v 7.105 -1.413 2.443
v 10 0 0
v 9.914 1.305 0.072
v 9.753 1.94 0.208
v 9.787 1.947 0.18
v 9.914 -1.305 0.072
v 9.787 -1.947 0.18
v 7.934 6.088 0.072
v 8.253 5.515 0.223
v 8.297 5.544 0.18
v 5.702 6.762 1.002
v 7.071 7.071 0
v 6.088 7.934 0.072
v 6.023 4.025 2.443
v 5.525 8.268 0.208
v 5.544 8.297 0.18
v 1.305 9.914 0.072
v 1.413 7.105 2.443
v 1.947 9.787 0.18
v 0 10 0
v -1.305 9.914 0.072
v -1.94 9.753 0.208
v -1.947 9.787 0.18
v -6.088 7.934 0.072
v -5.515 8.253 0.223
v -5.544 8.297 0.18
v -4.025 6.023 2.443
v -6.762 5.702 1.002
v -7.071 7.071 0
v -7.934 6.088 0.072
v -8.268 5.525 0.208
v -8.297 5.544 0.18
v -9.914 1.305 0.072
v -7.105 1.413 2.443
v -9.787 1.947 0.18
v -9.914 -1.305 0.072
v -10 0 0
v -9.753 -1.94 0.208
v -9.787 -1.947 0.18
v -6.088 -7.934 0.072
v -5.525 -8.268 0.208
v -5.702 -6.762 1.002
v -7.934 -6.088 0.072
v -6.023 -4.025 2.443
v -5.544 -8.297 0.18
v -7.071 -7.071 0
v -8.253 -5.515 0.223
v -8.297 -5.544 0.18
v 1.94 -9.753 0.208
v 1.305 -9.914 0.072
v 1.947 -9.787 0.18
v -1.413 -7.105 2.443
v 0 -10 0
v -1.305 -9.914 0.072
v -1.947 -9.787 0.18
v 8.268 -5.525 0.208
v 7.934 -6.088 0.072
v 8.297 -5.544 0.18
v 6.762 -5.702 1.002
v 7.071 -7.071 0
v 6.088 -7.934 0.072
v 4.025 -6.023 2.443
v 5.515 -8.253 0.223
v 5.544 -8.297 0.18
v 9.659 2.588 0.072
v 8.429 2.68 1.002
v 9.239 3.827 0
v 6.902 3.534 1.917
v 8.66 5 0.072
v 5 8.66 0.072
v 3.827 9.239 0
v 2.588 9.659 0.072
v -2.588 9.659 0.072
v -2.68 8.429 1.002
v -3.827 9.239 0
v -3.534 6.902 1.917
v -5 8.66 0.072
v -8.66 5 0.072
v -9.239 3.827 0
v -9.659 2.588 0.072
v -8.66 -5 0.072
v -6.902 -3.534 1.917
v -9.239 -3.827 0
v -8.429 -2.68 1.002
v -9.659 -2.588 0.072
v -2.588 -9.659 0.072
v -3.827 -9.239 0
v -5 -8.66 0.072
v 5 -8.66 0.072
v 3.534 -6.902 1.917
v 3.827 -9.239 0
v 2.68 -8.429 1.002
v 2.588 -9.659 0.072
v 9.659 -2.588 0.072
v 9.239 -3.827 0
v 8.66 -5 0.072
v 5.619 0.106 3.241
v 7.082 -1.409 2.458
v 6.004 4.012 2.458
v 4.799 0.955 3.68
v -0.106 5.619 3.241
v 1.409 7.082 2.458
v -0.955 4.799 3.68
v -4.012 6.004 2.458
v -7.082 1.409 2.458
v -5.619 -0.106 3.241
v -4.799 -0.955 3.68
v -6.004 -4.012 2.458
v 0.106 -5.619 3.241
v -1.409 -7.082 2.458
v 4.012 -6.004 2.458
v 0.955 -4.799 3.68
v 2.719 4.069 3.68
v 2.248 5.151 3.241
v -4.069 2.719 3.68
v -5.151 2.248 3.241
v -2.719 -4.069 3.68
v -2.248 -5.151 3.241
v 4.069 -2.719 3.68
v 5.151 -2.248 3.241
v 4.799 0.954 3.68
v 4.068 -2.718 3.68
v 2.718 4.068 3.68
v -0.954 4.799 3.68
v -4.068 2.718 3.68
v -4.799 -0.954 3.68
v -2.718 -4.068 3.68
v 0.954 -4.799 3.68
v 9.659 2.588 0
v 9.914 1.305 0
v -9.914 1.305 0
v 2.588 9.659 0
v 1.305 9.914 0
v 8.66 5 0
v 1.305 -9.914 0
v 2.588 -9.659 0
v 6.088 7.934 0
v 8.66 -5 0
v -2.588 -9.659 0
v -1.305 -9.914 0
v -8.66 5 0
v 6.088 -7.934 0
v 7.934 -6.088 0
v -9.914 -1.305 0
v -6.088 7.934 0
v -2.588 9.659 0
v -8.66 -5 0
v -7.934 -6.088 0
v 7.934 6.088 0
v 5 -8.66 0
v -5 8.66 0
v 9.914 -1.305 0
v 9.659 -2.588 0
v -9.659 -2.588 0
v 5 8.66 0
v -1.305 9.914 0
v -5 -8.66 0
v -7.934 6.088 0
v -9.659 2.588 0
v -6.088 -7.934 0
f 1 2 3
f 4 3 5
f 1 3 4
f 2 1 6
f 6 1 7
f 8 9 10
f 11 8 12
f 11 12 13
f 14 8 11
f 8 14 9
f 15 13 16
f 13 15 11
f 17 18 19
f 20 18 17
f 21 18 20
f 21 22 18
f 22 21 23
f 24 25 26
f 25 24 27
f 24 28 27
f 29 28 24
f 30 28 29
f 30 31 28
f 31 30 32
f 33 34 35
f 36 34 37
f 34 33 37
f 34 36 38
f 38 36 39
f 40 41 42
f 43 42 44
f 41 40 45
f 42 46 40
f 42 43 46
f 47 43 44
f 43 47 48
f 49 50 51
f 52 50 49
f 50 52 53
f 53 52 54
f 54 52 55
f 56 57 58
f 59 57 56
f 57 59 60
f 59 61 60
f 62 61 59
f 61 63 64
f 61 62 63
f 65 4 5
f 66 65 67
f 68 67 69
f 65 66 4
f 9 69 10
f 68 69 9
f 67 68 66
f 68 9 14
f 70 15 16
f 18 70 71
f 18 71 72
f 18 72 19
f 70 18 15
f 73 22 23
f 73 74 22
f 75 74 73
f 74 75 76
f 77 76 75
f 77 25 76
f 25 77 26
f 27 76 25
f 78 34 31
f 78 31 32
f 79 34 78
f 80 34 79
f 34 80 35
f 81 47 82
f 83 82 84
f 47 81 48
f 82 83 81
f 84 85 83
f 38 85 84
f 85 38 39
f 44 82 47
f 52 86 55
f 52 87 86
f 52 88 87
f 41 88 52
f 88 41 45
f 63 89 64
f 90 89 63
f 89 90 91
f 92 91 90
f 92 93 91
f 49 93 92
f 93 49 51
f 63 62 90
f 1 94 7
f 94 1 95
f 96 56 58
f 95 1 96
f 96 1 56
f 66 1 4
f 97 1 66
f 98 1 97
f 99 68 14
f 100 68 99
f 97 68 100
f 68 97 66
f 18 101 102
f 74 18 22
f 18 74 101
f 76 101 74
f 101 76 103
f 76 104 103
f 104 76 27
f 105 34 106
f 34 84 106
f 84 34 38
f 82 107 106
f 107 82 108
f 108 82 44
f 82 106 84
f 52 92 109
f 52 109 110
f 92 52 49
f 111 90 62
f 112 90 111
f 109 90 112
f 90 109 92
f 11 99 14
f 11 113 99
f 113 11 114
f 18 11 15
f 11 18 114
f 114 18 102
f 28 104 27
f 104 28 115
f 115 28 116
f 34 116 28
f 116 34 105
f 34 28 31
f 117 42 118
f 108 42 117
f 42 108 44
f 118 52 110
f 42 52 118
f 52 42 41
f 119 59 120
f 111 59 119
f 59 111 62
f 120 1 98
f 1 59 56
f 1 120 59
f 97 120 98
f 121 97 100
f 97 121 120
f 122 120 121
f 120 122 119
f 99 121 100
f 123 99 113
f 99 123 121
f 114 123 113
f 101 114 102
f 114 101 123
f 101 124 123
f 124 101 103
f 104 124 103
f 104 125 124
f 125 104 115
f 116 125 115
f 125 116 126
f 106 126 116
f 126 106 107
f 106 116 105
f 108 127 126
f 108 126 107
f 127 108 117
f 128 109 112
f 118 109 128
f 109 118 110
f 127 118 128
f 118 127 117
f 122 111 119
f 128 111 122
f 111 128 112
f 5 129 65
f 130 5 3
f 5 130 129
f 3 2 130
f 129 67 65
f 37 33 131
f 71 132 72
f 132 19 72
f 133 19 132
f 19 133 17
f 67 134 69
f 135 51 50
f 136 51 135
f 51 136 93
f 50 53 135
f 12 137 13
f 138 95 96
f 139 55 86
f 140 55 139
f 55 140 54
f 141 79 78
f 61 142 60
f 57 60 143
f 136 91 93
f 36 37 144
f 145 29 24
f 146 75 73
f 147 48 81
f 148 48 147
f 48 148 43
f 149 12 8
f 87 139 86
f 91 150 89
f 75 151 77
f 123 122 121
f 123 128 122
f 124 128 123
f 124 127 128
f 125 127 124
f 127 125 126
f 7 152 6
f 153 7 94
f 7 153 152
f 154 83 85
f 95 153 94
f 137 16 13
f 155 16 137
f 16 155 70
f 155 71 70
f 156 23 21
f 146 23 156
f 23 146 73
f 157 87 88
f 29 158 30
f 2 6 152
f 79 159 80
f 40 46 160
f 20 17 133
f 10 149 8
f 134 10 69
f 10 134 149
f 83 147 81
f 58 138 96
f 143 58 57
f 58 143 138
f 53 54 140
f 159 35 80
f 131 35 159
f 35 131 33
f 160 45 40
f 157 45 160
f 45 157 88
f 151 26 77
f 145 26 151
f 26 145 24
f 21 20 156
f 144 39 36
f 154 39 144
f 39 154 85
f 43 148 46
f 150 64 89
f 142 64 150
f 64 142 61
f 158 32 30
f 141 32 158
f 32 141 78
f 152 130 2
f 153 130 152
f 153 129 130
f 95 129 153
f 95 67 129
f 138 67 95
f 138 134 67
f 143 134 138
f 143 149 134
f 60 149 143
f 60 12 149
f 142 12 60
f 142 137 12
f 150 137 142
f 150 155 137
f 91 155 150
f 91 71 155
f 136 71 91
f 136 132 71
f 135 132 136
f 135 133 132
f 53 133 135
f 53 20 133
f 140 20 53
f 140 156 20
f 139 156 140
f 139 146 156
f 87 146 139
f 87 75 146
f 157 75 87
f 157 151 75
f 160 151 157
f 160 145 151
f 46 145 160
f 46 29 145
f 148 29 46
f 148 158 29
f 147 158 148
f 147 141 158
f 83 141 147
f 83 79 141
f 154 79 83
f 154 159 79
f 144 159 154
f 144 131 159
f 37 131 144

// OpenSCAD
module sea_urchin()
difine();
//valiable data

//Diamond_size_d
dd=20;//[10:40]

//Diamond_hight_retio
hr=0.615;

// ignore variable values
pag1=42.45*1;//Pavillion_angle1
pag2=40.75*1;////Pavillion_angle2
cag3=40.16*1;////Crown_angle3
cag4=34.5*1;////Crown_angle4
cag5=24.35*1;////Crown_angle4
dh=dd*hr;//Diamond_hight_retio

difference(){
    difference() {
			translate([0,0,-dd*0.431])cylinder(h=dh,r=dd/2,$fn=48);	
union(){
	for (i = [ 0 : 8-1] ) {
				rotate([0,0,360/8*i]) translate([dd/2,0,-5/cos(pag1)]) rotate([0,90-pag1,0])cube(size=[dd/2,dd/2,1.1*dd], center=true);
							}
for (i = [ 0 : 8-1] ) {
				rotate([0,0,360/8*i+22.5]) translate([dd/2,0,-5/cos(pag1)]) rotate([0,90-pag1,0])cube(size=[dd/2,dd/2,1.1*dd], center=true);
							}
	for (i = [ 0 : 8-1] ) {
				rotate([0,0,360/8*i+11.25]) translate([dd/2,0,-5/cos(pag1)]) rotate([0,90-pag2,0])cube(size=[dd/2,dd/2,dd], center=true);
							}
}
union(){
	for (i = [ 0 : 8-1] ) {
		rotate([0,0,360/8*i]) translate([dd/2,0,5/cos(cag3)]) rotate([0,90-cag3,180])cube(size=[dd/2,dd/2,dd], center=true);
							}
for (i = [ 0 : 8-1] ) {
		rotate([0,0,360/8*i+22.5]) translate([dd/2,0,5/cos(cag3)]) rotate([0,90-cag3,180])cube(size=[dd/2,dd/2,dd], center=true);
							}
}
union(){
	for (i = [ 0 : 4-1] ) {
		rotate([0,0,360/4*i+11.25]) translate([dd/2,0,5/cos(cag4)+0.0085*dd]) rotate([0,90-cag4,180])cube(size=[dd/2,dd/2,dd], center=true);
							}
for (i = [ 0 : 4-1] ) {
		rotate([0,0,360/4*i+11.25+45]) translate([dd/2,0,5/cos(cag4)+0.0085*dd]) rotate([0,90-cag4,180])cube(size=[dd/2,dd/2,dd], center=true);
							}
	for (i = [ 0 : 8-1] ) {
	rotate([0,0,360/8*i-11.25]) translate([dd/2,0,5/cos(cag5)+0.060*dd]) rotate([0,90-cag5,180])cube(size=[dd/2,dd/2,dd], center=true);
							}
		}
			};
            translate([-dd/2,-dd/2,-dd]) cube(dd,dd,dd);}
            
//module sea_urchin();


//translate([-dd/2,-dd/2,-dd]) cube(dd,dd,dd);
	
